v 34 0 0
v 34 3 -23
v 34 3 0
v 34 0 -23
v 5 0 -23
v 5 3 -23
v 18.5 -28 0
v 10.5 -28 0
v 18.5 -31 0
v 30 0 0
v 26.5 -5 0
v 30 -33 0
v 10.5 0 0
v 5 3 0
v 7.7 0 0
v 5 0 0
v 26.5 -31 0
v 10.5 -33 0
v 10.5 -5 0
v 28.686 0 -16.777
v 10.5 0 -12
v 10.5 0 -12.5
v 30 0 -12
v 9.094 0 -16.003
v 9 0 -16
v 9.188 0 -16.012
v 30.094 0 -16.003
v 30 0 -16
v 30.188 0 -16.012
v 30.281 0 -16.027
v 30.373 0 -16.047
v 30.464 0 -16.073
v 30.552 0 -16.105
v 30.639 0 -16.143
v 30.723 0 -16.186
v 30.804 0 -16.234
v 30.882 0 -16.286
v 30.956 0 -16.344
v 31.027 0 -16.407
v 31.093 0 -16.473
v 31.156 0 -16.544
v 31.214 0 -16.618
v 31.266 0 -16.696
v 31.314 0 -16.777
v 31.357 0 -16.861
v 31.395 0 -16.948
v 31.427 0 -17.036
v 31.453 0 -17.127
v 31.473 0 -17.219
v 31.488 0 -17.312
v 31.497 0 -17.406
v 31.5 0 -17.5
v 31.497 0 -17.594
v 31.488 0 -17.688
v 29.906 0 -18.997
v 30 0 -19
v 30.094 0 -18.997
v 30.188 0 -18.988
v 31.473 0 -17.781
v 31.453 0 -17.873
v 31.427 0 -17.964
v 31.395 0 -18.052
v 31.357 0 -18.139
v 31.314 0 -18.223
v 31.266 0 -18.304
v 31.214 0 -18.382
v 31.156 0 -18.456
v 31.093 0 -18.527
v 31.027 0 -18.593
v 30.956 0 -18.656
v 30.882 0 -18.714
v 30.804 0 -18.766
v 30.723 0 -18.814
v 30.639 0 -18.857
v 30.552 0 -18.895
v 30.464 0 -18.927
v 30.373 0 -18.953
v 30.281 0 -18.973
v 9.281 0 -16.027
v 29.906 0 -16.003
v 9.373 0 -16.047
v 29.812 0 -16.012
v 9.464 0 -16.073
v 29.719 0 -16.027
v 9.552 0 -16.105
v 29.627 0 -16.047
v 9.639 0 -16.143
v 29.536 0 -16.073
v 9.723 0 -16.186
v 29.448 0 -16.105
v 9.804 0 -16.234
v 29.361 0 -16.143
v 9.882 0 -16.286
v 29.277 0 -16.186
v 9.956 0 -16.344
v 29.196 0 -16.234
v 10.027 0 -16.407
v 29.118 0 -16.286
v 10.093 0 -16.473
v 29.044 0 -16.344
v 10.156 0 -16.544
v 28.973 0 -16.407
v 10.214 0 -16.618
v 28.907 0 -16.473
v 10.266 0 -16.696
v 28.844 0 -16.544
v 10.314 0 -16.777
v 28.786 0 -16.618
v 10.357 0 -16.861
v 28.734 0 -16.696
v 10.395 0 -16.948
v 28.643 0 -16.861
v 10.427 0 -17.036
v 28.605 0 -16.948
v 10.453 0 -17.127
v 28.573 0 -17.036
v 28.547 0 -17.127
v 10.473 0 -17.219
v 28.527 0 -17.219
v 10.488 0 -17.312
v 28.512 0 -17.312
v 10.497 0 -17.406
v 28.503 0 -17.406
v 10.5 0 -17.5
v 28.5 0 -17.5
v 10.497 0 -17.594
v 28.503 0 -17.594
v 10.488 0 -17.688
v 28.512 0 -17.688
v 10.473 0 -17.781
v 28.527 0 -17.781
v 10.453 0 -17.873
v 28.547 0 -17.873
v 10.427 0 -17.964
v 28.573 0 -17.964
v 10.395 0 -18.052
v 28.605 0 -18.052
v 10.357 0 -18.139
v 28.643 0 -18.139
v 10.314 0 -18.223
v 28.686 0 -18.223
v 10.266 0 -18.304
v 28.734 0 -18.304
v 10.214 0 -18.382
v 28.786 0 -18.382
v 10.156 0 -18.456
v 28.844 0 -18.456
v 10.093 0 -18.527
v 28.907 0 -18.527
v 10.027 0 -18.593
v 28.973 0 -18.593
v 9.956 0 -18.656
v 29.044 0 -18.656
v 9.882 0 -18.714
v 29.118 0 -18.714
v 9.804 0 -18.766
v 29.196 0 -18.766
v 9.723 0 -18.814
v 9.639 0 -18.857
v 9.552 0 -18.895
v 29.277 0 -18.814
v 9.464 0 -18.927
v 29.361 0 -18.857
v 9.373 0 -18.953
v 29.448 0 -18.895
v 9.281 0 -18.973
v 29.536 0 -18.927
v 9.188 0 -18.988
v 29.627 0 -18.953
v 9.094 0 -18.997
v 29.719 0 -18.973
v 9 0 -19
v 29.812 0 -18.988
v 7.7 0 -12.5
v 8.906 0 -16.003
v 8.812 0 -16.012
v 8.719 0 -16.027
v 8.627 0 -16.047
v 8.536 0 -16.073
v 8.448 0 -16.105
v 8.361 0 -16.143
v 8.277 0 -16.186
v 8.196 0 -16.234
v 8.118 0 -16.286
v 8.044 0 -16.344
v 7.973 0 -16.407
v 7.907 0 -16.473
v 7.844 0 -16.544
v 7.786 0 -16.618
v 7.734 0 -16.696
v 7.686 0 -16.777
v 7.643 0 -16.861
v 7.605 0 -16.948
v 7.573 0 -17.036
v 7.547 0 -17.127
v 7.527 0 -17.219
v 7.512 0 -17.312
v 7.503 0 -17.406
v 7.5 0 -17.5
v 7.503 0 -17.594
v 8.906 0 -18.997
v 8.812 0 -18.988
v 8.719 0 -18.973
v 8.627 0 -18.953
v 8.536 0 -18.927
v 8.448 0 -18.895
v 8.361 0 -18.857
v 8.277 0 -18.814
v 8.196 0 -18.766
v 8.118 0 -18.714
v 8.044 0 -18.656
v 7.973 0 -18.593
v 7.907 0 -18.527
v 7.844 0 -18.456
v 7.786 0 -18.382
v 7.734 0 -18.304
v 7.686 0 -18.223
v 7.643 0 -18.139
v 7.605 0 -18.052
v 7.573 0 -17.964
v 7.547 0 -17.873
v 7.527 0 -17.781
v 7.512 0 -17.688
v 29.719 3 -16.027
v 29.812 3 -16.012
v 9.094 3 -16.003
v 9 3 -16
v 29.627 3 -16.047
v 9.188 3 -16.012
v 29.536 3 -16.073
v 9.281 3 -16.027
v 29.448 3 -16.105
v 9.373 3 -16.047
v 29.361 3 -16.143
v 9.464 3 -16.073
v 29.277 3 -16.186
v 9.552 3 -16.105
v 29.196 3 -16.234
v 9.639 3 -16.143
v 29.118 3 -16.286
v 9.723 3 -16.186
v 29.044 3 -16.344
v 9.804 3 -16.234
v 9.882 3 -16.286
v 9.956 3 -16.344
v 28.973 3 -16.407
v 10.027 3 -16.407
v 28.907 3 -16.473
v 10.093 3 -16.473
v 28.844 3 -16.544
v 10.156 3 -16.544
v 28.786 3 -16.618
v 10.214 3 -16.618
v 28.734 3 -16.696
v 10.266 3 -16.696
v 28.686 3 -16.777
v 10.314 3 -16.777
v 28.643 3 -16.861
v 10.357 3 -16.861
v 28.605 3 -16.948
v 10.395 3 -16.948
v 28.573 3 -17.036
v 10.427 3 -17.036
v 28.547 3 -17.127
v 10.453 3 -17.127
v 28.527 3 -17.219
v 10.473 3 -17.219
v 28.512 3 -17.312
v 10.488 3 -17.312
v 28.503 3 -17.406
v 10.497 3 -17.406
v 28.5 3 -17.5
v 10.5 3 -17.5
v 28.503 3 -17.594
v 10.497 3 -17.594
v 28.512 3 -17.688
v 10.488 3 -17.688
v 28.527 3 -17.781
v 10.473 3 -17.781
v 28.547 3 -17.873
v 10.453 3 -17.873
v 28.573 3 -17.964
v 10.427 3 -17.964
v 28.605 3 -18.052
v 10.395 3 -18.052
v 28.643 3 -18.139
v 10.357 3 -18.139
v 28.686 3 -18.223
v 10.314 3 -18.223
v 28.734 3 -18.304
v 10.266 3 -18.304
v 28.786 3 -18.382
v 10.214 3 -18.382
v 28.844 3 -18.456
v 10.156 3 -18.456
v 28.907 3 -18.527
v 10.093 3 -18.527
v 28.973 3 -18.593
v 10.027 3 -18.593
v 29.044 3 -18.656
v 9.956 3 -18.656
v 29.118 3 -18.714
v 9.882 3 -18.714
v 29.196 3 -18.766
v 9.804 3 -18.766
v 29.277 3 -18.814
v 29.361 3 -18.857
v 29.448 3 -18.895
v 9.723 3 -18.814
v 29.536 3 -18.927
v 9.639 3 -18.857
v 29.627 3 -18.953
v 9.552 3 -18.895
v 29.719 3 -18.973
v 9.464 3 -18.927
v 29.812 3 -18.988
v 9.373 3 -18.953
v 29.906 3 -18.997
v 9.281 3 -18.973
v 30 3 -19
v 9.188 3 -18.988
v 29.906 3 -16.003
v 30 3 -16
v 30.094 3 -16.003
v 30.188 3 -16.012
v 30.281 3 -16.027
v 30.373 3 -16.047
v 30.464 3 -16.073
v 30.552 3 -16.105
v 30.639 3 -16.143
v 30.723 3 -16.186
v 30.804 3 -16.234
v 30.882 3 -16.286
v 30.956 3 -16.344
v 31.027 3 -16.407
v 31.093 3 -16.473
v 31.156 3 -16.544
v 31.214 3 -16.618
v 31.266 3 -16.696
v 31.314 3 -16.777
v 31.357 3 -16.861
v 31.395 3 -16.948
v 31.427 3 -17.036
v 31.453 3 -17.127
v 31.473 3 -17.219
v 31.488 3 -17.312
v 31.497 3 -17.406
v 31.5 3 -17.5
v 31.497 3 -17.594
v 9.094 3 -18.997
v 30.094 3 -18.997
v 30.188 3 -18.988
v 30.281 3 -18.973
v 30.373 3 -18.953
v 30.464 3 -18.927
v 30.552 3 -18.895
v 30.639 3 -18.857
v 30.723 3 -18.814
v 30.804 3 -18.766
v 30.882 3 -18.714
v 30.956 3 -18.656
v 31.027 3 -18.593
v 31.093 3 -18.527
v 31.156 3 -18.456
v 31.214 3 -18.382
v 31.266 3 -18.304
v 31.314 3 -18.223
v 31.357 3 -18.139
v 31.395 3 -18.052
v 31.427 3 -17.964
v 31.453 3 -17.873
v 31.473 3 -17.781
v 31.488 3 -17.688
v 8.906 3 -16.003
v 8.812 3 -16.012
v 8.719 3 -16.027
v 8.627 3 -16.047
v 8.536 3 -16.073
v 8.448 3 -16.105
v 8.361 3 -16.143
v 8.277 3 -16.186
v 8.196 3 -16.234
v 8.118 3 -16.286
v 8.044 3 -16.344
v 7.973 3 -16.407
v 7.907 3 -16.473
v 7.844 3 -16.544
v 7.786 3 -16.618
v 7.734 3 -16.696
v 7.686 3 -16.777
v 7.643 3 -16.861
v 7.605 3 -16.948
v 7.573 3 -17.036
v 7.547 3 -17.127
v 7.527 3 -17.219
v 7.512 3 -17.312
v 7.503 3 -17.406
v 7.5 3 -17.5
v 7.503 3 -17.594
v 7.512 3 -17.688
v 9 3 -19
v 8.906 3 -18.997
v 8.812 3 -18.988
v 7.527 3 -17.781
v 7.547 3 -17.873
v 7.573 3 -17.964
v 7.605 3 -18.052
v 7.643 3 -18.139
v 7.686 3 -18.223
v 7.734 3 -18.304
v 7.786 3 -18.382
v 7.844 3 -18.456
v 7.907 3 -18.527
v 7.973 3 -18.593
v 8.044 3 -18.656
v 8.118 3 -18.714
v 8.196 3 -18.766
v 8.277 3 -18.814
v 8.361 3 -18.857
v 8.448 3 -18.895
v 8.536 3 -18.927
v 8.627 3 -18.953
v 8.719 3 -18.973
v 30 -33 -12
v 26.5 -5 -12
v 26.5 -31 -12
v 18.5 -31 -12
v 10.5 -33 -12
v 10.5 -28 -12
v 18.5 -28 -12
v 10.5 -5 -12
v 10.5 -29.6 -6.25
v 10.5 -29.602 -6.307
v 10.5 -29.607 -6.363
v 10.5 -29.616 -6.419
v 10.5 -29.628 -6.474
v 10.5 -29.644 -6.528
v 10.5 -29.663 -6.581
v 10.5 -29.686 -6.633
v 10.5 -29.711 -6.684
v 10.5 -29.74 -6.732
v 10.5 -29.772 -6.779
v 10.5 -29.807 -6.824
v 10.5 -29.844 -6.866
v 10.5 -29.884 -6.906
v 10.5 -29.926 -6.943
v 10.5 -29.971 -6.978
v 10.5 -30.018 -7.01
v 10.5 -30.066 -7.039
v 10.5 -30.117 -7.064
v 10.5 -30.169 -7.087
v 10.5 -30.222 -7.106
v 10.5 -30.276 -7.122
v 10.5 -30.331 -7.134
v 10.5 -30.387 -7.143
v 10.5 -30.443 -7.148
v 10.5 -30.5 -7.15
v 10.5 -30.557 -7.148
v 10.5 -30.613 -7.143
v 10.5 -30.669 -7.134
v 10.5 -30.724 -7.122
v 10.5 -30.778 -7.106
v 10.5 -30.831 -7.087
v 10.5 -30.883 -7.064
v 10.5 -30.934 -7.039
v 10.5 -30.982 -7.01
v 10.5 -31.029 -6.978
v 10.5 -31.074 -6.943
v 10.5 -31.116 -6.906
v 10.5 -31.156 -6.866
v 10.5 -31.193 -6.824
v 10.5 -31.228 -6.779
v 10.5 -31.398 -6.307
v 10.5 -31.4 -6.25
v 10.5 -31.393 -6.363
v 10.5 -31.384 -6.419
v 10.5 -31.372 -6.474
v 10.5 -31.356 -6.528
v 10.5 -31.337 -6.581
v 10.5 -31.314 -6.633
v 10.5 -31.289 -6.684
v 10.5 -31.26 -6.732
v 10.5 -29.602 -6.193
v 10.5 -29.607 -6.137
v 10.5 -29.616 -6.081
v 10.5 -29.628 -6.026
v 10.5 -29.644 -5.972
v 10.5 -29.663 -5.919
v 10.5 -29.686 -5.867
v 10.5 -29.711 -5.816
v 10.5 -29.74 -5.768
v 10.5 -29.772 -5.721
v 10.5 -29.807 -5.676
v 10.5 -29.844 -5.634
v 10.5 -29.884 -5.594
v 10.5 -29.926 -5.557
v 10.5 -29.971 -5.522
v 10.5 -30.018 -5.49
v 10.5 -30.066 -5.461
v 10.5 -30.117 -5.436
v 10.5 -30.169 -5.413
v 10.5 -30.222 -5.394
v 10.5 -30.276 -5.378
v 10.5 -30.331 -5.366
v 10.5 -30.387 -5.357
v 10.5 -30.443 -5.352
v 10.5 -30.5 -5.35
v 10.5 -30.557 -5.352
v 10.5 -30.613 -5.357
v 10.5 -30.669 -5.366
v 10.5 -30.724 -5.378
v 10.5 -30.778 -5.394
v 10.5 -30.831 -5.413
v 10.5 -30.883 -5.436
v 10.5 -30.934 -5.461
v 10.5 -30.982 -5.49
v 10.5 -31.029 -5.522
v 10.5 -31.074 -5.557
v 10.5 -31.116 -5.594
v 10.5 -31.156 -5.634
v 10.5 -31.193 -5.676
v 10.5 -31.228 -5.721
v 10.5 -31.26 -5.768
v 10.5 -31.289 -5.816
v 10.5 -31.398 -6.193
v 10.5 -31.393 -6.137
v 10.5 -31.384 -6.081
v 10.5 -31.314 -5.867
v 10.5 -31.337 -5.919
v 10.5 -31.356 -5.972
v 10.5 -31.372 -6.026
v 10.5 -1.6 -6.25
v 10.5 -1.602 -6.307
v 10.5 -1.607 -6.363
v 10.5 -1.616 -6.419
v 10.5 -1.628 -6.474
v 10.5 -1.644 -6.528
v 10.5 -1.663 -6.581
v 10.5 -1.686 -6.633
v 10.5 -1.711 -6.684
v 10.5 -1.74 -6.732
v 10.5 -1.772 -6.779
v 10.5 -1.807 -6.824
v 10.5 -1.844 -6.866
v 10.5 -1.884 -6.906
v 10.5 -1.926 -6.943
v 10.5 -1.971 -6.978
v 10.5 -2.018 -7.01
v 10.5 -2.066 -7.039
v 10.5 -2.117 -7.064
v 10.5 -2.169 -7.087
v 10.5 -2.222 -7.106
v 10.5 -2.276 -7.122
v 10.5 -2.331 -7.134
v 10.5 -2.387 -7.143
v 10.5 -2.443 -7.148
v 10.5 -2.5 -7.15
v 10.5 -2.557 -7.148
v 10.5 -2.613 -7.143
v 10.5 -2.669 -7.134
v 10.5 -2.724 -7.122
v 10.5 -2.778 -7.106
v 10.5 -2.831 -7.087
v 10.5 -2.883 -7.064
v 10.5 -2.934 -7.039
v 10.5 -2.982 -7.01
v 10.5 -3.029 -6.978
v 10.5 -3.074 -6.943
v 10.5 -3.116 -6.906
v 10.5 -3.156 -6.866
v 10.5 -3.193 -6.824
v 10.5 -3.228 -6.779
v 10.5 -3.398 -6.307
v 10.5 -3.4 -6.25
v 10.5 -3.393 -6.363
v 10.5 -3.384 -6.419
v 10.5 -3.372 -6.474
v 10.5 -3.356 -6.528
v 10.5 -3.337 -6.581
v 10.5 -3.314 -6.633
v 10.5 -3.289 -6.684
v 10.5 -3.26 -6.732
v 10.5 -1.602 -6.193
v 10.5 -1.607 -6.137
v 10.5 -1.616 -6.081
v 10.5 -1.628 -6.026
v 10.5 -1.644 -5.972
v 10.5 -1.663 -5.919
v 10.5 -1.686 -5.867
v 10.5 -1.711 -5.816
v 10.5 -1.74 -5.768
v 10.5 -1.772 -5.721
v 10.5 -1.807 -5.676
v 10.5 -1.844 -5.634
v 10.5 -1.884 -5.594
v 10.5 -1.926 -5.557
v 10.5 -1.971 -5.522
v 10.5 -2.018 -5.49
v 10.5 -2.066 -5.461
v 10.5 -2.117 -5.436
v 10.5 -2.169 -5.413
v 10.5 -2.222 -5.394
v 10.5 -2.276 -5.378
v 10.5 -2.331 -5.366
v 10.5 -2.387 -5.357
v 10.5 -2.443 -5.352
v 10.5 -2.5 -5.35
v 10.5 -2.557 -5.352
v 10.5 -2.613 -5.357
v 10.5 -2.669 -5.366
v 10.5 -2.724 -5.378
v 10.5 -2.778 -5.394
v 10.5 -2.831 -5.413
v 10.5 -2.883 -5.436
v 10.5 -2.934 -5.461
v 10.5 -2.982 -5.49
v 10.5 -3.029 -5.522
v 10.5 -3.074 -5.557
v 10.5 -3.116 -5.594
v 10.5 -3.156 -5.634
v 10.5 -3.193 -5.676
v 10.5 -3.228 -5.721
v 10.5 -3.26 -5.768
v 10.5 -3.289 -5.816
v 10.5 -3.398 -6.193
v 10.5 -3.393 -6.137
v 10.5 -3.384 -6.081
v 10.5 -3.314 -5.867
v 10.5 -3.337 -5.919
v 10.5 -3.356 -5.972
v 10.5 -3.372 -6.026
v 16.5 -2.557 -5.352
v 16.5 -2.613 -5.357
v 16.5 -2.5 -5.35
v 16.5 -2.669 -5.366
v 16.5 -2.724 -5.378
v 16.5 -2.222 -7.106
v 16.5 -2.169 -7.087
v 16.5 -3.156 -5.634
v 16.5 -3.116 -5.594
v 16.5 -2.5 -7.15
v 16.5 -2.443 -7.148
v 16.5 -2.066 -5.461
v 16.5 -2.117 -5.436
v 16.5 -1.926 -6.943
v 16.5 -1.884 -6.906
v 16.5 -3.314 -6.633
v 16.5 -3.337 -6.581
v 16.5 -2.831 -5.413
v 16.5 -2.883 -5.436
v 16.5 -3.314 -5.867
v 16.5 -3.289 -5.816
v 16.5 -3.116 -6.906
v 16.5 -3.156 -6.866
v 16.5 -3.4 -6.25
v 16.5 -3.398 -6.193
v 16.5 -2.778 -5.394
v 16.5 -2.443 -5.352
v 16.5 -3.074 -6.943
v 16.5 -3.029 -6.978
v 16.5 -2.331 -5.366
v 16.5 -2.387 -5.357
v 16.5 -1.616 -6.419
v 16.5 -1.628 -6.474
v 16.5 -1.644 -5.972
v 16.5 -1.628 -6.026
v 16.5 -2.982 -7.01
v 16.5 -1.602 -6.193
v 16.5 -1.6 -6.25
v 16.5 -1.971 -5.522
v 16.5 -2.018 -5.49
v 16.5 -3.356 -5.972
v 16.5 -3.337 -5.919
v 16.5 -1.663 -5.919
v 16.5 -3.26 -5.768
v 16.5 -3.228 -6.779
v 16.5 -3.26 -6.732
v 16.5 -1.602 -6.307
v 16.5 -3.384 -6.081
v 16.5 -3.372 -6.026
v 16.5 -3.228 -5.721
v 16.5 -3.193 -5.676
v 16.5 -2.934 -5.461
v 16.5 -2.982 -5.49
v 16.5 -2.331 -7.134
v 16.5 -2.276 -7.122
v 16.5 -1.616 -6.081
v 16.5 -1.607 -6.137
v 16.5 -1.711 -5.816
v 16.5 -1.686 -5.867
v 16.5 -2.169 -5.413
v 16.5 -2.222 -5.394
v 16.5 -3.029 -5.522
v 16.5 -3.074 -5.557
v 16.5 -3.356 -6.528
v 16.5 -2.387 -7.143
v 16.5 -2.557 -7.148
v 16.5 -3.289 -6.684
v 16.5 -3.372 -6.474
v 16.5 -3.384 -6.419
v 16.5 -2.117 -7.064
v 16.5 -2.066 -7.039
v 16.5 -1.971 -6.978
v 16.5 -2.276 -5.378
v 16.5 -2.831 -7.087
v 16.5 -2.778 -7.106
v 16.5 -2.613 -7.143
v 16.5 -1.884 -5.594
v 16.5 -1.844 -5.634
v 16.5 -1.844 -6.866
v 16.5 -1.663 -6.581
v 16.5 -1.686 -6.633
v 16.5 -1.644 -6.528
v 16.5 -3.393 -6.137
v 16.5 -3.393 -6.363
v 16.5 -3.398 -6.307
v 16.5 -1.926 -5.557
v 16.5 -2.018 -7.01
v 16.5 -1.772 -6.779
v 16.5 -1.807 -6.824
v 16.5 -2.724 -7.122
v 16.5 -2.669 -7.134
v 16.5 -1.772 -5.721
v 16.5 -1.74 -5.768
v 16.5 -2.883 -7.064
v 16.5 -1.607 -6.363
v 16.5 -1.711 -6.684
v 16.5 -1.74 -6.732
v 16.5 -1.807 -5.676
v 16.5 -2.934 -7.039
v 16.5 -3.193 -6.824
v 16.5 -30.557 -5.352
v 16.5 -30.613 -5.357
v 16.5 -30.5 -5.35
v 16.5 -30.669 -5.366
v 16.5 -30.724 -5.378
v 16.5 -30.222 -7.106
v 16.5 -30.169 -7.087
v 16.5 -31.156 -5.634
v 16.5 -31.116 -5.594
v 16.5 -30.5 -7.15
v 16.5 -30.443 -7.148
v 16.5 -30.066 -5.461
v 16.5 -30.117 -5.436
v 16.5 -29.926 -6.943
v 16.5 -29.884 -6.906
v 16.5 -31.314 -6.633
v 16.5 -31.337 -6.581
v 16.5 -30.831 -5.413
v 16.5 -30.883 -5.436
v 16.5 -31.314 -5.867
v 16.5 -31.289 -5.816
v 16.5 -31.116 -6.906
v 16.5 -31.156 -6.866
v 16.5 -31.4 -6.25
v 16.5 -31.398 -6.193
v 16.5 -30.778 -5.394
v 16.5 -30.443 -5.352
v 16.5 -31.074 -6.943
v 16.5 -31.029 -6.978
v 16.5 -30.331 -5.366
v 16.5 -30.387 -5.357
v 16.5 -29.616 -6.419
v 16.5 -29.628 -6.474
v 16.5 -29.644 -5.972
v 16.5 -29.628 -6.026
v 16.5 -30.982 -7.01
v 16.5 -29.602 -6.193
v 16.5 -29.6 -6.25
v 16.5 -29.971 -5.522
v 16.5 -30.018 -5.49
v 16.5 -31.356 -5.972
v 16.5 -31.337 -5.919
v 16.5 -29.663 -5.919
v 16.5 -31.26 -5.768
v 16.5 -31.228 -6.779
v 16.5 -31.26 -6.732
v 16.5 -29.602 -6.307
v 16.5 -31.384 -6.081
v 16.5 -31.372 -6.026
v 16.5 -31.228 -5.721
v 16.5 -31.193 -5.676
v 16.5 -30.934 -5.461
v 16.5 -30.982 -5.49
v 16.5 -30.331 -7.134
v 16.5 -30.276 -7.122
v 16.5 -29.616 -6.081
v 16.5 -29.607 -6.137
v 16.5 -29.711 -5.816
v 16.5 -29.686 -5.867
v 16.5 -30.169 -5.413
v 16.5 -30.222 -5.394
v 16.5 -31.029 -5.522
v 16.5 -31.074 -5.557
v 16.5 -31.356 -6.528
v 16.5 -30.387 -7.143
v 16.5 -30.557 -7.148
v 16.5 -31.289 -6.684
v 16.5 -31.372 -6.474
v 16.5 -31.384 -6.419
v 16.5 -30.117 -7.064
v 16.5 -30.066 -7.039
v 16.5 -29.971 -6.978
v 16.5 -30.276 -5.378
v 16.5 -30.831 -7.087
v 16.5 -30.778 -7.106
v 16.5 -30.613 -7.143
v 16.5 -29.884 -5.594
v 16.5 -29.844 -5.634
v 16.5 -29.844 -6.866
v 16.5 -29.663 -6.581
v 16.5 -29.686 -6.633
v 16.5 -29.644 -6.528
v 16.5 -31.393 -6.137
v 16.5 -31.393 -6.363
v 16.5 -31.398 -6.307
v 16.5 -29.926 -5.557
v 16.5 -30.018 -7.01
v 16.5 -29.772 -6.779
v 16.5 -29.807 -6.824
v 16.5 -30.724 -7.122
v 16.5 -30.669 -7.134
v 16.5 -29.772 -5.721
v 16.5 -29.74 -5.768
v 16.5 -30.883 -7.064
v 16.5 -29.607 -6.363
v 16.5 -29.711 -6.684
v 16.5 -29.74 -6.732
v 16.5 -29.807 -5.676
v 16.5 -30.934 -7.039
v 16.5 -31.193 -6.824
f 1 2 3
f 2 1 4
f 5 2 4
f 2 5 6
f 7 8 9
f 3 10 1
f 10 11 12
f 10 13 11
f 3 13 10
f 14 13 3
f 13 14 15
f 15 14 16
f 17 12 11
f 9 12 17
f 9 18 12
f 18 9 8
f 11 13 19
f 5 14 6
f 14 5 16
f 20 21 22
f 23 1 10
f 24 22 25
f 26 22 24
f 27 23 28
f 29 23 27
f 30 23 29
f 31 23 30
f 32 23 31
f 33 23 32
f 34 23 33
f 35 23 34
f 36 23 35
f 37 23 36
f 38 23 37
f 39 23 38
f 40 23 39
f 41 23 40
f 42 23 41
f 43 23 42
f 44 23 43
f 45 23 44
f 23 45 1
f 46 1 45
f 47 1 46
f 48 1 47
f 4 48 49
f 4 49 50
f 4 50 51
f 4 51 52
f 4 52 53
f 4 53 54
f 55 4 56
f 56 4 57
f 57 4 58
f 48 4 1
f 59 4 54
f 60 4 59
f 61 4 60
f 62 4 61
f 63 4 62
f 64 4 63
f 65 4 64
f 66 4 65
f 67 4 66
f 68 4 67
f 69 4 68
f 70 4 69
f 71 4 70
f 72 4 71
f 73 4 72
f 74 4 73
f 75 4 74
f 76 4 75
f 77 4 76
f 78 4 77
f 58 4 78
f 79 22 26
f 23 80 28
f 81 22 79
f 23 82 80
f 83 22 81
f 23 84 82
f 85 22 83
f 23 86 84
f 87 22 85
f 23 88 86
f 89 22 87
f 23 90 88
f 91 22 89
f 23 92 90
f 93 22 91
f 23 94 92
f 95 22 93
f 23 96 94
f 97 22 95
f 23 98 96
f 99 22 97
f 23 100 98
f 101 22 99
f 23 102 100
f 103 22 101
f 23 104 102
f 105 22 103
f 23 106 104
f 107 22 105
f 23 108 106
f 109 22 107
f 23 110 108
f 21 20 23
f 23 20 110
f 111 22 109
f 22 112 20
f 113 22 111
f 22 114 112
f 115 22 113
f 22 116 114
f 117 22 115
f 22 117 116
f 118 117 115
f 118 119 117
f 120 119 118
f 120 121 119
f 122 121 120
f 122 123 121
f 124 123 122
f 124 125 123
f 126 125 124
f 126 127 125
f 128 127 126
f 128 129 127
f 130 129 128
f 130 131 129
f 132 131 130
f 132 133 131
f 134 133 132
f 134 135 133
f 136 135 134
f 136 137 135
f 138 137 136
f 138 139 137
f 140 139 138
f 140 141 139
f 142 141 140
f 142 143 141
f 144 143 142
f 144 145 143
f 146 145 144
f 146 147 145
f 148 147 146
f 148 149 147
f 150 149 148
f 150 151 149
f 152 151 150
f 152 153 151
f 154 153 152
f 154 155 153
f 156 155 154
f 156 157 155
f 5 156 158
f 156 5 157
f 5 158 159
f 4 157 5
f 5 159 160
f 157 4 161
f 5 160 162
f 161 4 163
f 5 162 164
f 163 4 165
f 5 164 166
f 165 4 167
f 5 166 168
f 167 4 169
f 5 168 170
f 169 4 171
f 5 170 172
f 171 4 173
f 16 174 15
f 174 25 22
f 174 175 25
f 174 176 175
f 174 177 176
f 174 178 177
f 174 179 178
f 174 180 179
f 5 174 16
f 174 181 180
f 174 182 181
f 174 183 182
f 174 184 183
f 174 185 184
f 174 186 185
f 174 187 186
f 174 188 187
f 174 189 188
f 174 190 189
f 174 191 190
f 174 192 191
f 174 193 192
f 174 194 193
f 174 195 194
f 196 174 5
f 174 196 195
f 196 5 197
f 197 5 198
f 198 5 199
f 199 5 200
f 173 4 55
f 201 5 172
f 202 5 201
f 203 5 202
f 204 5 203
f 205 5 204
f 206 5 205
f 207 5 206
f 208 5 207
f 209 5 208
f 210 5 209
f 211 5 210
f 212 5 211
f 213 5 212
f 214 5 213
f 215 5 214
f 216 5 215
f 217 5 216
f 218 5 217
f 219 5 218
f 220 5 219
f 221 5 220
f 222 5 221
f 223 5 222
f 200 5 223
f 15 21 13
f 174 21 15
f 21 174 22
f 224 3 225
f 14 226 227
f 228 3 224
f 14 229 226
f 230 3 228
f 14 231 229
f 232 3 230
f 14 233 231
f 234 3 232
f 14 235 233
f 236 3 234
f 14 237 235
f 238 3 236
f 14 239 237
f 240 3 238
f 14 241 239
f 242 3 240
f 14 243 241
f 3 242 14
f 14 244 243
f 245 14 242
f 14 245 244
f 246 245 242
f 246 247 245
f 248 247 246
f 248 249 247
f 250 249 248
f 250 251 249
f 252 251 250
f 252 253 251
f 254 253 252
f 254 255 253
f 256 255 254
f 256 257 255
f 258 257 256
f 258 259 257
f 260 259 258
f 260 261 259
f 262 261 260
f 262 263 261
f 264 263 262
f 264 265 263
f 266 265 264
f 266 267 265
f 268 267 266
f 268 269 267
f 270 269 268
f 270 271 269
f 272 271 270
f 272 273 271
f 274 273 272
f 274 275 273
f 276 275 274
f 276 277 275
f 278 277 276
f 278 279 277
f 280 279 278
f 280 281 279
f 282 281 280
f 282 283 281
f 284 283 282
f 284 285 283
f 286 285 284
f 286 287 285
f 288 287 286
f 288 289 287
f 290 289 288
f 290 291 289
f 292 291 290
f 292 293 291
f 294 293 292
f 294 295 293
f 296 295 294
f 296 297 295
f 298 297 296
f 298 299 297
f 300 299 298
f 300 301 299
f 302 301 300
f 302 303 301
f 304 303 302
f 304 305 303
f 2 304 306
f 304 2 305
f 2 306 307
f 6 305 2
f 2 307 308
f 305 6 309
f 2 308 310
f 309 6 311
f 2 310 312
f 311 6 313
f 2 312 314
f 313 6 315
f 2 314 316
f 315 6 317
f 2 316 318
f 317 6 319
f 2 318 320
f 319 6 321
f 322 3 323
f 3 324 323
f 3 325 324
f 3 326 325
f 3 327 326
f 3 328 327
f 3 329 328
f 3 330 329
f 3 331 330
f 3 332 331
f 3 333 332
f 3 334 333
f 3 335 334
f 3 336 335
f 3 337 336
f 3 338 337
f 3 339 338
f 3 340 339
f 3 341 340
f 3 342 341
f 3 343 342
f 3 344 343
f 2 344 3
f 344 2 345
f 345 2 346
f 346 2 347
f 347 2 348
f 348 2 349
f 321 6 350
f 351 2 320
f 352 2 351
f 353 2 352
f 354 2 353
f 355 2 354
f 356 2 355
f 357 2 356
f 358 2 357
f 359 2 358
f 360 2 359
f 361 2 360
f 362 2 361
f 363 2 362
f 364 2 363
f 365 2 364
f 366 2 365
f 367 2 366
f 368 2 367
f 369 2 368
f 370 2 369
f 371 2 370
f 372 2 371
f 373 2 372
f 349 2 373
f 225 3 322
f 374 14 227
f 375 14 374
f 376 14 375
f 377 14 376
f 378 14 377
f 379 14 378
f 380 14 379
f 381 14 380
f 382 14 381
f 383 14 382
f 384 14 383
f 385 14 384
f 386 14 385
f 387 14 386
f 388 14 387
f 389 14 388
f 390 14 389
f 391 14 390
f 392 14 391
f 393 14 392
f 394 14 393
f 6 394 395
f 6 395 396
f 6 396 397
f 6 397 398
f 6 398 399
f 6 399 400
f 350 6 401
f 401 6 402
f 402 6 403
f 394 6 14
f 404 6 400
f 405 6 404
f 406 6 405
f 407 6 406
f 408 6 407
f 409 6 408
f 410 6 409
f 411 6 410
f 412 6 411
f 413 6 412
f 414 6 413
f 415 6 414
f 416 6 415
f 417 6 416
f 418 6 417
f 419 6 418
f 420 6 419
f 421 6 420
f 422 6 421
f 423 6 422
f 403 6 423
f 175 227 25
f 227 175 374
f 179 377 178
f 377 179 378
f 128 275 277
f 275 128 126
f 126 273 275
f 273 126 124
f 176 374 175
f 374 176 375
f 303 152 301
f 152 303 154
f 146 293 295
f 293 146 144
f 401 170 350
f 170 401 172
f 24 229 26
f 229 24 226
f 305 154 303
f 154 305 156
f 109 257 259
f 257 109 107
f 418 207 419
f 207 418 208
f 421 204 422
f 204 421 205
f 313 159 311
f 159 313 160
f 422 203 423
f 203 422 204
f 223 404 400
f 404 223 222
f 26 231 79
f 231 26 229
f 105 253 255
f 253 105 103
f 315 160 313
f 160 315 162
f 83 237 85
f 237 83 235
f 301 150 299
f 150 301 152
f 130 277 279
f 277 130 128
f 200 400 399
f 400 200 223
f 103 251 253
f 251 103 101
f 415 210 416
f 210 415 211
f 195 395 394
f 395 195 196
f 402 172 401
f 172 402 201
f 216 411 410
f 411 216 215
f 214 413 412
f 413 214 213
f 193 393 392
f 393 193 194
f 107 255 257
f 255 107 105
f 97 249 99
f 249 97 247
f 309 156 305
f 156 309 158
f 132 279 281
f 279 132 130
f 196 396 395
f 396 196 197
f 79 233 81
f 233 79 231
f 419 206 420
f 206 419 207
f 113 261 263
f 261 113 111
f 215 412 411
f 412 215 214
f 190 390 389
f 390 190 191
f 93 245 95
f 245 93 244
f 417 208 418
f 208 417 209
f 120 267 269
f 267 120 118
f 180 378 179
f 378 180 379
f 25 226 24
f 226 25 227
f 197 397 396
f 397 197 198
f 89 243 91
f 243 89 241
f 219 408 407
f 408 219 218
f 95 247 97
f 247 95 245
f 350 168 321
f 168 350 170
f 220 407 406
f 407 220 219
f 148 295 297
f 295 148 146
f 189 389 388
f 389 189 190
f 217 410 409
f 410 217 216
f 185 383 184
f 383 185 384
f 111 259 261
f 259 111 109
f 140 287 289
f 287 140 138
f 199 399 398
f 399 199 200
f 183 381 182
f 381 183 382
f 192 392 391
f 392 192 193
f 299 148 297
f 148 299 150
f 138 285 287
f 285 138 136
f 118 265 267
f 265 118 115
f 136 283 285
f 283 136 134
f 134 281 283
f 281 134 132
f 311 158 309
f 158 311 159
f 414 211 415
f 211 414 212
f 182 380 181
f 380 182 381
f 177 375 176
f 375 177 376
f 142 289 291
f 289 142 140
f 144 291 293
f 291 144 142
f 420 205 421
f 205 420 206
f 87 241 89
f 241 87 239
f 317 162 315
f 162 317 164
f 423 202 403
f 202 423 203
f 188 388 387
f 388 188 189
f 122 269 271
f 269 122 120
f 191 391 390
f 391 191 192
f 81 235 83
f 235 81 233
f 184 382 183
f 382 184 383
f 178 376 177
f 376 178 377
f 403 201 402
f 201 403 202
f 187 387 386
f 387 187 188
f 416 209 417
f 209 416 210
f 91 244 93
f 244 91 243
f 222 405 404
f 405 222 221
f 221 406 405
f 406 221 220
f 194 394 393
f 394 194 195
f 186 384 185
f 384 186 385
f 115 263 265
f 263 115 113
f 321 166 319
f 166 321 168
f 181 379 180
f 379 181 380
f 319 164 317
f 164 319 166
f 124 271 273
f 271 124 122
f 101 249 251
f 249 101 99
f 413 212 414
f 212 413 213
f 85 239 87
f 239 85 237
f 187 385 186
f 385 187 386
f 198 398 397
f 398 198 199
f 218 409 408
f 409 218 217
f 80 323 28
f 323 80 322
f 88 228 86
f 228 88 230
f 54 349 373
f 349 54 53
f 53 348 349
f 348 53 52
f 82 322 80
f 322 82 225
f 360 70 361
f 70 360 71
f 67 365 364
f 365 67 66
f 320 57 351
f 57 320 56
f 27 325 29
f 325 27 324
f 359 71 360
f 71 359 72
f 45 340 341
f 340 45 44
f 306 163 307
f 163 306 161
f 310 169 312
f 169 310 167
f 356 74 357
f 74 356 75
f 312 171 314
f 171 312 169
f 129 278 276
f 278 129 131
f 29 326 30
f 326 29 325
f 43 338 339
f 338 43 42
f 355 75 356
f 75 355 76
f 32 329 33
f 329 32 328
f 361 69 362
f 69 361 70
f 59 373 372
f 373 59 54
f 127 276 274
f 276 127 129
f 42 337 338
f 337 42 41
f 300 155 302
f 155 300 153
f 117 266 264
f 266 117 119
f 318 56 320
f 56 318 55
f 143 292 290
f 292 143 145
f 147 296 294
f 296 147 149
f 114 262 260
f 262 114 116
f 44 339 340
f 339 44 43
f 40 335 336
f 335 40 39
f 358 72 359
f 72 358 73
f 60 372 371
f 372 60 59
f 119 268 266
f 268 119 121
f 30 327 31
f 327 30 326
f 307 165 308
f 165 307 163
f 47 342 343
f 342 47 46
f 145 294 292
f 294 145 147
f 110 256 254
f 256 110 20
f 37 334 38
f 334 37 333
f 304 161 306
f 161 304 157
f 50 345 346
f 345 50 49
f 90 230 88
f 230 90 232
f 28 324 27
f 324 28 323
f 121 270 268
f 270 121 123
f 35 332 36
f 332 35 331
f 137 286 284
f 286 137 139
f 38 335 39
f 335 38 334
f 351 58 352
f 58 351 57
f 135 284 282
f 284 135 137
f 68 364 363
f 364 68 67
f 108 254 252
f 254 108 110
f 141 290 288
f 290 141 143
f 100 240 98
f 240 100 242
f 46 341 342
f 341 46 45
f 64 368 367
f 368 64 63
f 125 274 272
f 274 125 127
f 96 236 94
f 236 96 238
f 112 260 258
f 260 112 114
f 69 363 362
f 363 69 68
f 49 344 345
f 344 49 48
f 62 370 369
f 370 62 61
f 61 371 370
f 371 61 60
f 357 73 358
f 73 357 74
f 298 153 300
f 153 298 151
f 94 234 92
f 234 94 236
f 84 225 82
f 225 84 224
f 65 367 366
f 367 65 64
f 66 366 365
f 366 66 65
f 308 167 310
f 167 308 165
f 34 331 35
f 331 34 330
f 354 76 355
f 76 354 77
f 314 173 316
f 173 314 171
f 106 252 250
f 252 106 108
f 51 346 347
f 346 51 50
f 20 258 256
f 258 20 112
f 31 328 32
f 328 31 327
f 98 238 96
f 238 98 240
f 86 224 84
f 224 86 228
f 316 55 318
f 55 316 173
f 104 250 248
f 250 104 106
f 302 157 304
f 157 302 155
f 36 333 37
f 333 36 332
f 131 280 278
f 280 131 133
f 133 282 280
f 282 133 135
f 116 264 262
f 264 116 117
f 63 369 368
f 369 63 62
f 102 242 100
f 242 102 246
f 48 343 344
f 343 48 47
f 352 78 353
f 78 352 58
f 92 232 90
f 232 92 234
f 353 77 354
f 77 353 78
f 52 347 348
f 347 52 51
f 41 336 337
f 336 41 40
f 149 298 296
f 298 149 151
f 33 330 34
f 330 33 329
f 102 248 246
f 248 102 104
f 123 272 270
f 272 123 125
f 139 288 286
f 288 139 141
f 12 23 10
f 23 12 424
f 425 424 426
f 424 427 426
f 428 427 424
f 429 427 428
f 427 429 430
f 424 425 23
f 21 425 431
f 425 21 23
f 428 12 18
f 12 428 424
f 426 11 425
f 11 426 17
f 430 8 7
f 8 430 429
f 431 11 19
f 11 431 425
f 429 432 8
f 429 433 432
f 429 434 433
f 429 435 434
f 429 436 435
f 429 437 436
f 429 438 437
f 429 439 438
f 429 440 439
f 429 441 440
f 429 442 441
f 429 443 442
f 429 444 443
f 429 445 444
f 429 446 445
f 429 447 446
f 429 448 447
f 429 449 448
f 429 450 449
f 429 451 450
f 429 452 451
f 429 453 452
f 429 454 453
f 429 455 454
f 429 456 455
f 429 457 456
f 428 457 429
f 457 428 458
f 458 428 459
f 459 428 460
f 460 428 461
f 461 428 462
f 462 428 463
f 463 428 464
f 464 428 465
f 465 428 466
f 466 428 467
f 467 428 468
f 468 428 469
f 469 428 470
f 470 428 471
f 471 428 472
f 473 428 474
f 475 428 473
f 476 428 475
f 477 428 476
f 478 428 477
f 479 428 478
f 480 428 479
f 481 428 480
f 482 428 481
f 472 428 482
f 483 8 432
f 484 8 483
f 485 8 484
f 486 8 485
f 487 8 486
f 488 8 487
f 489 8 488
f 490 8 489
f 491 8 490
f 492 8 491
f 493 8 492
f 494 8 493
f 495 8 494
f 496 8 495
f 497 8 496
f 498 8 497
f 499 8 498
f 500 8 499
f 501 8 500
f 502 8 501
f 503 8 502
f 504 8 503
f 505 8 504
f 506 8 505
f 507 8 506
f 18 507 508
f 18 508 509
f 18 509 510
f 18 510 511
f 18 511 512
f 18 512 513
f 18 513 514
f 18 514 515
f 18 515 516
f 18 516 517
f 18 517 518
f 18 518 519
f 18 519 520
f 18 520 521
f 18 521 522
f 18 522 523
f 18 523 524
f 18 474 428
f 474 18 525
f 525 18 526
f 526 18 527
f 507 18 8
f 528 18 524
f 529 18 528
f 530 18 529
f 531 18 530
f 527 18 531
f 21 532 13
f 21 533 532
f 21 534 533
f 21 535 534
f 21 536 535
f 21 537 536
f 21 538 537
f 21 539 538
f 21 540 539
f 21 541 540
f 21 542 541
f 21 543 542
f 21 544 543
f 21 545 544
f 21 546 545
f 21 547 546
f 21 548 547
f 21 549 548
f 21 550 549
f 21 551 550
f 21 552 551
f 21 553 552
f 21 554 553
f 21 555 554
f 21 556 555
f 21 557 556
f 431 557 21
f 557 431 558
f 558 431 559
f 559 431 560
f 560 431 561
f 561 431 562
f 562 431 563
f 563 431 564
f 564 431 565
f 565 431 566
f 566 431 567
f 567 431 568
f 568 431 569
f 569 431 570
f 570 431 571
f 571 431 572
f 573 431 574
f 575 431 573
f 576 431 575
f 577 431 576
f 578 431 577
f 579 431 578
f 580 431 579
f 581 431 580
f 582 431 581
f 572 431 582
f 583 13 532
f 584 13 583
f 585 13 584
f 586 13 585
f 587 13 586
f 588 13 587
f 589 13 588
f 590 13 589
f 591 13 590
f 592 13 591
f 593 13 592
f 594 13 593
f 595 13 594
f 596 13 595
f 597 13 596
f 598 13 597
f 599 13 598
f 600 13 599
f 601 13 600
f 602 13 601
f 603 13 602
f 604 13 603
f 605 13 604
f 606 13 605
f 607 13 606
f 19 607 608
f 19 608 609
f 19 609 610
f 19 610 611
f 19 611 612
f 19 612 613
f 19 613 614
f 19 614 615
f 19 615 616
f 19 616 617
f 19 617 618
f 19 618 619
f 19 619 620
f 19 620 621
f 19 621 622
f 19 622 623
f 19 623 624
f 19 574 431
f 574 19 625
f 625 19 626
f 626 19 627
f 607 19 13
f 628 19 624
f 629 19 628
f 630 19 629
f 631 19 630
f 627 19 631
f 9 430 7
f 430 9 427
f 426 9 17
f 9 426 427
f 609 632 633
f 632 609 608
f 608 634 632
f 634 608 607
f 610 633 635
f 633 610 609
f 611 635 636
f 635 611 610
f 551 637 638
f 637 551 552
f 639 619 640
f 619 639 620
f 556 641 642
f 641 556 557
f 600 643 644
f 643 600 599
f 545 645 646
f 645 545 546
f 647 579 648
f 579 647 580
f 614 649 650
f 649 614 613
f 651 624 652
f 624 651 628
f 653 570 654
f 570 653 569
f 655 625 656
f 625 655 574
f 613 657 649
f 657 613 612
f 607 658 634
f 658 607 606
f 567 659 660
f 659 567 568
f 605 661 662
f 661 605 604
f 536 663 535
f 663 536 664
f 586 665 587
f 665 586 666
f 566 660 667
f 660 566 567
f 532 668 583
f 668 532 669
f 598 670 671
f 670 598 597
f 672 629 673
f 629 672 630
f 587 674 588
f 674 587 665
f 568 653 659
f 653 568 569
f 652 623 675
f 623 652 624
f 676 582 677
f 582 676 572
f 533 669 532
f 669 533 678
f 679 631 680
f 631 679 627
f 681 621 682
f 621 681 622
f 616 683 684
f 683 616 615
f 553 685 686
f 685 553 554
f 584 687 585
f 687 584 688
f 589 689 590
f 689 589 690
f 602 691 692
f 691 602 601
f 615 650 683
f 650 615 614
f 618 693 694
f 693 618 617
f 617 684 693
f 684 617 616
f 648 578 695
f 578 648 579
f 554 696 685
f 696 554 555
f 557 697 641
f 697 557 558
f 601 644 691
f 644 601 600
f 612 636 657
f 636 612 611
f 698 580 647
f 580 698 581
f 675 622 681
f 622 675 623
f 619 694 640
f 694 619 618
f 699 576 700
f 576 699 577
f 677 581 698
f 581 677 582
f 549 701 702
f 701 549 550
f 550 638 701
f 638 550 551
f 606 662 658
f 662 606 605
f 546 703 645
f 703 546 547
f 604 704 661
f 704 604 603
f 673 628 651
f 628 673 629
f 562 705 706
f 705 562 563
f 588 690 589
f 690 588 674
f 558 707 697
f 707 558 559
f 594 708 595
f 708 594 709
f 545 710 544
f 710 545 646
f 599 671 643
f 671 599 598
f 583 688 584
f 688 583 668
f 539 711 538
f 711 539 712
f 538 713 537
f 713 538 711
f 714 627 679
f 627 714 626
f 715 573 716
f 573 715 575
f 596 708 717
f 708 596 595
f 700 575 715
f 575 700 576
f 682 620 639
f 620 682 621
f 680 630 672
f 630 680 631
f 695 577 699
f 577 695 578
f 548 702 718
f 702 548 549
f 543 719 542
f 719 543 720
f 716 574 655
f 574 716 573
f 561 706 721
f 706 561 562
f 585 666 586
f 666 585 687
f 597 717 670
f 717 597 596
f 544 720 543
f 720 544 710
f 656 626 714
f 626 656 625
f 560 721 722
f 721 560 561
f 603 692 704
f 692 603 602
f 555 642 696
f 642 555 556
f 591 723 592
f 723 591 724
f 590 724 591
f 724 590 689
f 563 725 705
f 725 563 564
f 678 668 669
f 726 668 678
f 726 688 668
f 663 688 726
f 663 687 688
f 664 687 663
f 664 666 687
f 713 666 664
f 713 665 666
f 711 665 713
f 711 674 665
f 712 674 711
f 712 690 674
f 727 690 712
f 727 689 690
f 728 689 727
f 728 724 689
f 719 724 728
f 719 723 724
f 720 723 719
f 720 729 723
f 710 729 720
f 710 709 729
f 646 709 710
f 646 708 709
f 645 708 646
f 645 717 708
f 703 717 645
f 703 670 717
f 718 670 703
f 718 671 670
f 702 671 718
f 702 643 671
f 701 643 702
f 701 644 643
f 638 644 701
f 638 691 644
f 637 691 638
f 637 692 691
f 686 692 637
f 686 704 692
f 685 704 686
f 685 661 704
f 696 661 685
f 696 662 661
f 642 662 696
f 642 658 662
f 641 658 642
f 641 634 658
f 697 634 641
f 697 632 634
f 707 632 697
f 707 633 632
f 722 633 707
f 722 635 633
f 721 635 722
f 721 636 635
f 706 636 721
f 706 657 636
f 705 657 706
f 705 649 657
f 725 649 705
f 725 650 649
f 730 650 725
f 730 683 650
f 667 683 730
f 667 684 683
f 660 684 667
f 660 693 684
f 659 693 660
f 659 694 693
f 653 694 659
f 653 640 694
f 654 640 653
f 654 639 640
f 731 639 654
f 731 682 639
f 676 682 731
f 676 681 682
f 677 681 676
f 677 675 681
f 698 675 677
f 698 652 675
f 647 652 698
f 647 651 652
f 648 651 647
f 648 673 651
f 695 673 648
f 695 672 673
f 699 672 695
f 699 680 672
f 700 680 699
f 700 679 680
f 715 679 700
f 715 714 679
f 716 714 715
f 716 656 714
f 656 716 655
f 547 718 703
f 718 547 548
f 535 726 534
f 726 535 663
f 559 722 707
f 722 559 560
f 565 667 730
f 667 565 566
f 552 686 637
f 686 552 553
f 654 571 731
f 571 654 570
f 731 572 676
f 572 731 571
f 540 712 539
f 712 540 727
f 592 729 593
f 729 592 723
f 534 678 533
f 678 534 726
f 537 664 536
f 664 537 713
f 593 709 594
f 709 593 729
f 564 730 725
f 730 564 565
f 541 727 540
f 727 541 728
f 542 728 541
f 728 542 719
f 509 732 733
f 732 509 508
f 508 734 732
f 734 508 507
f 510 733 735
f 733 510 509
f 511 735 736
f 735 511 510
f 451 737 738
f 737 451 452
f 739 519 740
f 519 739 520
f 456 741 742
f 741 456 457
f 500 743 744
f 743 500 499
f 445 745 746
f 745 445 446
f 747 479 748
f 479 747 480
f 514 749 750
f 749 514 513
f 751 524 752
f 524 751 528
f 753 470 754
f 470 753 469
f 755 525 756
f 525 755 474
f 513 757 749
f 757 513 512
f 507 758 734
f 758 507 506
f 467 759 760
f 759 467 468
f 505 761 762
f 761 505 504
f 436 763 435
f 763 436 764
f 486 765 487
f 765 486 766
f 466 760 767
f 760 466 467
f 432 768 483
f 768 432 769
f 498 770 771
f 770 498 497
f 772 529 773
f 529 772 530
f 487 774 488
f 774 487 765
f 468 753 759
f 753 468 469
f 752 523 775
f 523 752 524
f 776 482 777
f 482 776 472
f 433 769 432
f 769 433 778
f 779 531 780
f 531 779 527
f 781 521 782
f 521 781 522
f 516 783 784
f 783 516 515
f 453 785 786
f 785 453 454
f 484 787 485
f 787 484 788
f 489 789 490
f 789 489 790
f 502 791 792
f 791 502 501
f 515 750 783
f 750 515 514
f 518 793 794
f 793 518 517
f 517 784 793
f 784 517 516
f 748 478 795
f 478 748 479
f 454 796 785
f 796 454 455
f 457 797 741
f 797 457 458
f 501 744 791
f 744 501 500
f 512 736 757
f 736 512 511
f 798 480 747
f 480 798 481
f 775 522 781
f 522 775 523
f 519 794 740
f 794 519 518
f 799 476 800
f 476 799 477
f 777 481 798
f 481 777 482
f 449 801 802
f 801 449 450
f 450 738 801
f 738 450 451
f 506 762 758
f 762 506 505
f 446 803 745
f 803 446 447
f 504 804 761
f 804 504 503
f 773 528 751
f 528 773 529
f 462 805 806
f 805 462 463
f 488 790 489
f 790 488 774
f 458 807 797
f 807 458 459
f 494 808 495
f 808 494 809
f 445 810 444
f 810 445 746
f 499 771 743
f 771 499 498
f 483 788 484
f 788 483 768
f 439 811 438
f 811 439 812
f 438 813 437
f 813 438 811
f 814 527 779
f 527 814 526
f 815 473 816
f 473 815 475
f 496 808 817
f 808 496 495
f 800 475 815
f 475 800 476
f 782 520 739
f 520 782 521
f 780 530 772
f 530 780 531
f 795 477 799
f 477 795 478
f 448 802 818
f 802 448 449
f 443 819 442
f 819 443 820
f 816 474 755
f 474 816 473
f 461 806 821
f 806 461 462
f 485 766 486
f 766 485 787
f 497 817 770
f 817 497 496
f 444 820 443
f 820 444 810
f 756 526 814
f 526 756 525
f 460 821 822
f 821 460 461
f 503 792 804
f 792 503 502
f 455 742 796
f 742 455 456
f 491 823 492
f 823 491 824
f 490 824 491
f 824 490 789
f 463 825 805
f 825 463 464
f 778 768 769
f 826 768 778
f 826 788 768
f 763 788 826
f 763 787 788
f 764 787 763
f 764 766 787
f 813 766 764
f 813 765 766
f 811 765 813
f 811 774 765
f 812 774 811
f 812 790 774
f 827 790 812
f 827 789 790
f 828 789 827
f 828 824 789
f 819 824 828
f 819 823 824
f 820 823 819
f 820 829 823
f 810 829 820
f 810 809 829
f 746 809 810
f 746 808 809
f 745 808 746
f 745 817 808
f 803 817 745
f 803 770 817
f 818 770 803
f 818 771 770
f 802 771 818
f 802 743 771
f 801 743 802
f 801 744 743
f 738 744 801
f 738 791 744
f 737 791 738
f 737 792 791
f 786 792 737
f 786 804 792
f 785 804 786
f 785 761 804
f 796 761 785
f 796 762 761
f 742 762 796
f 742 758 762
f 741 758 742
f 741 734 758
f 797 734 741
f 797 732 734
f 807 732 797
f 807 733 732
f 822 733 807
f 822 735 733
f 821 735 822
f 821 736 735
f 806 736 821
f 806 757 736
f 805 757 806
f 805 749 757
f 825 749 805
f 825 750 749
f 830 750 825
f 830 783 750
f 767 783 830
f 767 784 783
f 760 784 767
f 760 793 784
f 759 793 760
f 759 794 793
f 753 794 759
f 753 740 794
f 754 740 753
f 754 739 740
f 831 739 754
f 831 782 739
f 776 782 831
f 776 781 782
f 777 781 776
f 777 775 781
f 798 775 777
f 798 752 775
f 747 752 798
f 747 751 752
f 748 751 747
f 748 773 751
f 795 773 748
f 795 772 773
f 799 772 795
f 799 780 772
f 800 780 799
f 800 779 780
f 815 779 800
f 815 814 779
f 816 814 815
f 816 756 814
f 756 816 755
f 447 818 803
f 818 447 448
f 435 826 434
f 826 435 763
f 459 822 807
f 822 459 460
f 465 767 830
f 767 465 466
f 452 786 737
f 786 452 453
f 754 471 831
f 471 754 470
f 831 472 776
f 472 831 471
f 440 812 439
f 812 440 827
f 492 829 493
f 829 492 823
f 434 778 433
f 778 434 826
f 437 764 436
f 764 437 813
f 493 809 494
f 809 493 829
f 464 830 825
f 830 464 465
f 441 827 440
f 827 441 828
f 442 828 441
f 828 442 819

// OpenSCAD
/*
 * Copyright (c) 2019, Vigibot
 * All rights reserved.
 * 
 * Redistribution and use in source and binary forms, with or without modification, are permitted provided that the following conditions are met:
 *   * Redistributions of source code must retain the above copyright notice, this list of conditions and the following disclaimer.
 *   * Redistributions in binary form must reproduce the above copyright notice, this list of conditions and the following disclaimer in the documentation and/or other materials provided with the distribution.
 * 
 * Description: OpenSCAD design for the smiling pan & tilt smiling head part of the Vigibot robot "Minus"
 * Design:      Quillès Jonathan / Pascal Piazzalungua
 * Author:      Quillès Jonathan
 */

PRECISION = 100;

$fn = PRECISION;

HEAD_Z = 12;
HEAD_TOP_X = 32;
HEAD_BOT_X = 30; 
HEAD_BOT_Y = 19.75;
HEAD_TOP_Y = 16.25;
HEAD_CHAMFER = (HEAD_TOP_X - HEAD_BOT_X) / 2;

SERVO_BOX_X = 23;
SERVO_BOX_Z = 12.5;
SERVO_STAND_THICKNESS = 2.8;
SERVO_STAND_LENGTH = 33;
SERVO_STAND_OFFSET = 5.9;
SERVO_HEAD_WIDTH = 23;
SERVO_HEAD_HEIGHT = 5;
SERVO_CENTER_Z = 6.25;

INTER_AXIS = 21;
OFFSET_AXIS = 9;
RADIUS = 1.5;
AXIS_HEIGHT = 17.5;

module box () {
    translate ( [10, 0, 0])
    cube([20, 33, HEAD_Z]);
   difference() {
    translate ( [5, -3, 0]) 
       cube([29, 3, 23]);
    translate ( [OFFSET_AXIS, 0, AXIS_HEIGHT])
    rotate( [90,0,0] )
    cylinder ( r=RADIUS, h=25, center=true );
    translate ( [OFFSET_AXIS + INTER_AXIS, 0, AXIS_HEIGHT])
    rotate( [90,0,0] )
    cylinder ( r=RADIUS, h=25, center=true );
   }
}

module chamfer() {
    translate ( [ -5, -0.5, HEAD_Z + 0.5 ])
    rotate( [0,90,0] )
    linear_extrude ( height=HEAD_TOP_X+10 )
        polygon ( [
            [2.2,0], [0,2.2], [0,0]
        ]);
}

module servoInServoBracket () {
    //Servo Box
    cube([SERVO_BOX_X, SERVO_BOX_X, SERVO_BOX_Z], center = true);
    
    //Servo Stand
    translate ( [-SERVO_STAND_OFFSET, 0, 0 ])
        cube([SERVO_STAND_THICKNESS, SERVO_STAND_LENGTH, SERVO_BOX_Z], center = true);
    
    //Servo Head 
    translate ( [-SERVO_BOX_X /2 - SERVO_HEAD_HEIGHT/2 + 0.1, SERVO_HEAD_WIDTH/2 - SERVO_BOX_X /2, 0 ])
        cube([SERVO_HEAD_HEIGHT, SERVO_HEAD_WIDTH, SERVO_BOX_Z], center = true);
    
    //Space for wires
    translate ( [SERVO_BOX_X /2 - 4, +SERVO_BOX_X /2, 0 ])
        cube([8, 6, SERVO_BOX_Z], center = true);
        
}

module drillThread ( t=5 ) {
    cylinder ( r=0.9, h=t, center=true );
}

module drillHead ( h=5 ) {
    cylinder ( r=1.1, h=h, center=true );
}

module drillScrew ( h=5, t=10 ) {
    drillHead ( h=h );
    drillThread ( t=t );
}


module servoScrewHoles() {

    // Stand holes
    translate ( [ 0, 2.5, SERVO_CENTER_Z]) {
        rotate( [0,90,0] )
            drillScrew ( 20, 33 );
    }
    translate ( [ 0, 33-2.5, SERVO_CENTER_Z]) {
        rotate( [0,90,0] )
            drillScrew ( 20, 33 );
    }
}

module servoBracket() {
    difference () {
        box();
        translate ( [HEAD_BOT_X/2, 33/2, SERVO_CENTER_Z])
            servoInServoBracket ();
        servoScrewHoles();
    }
}

rotate( [180,0,0])
    servoBracket();
